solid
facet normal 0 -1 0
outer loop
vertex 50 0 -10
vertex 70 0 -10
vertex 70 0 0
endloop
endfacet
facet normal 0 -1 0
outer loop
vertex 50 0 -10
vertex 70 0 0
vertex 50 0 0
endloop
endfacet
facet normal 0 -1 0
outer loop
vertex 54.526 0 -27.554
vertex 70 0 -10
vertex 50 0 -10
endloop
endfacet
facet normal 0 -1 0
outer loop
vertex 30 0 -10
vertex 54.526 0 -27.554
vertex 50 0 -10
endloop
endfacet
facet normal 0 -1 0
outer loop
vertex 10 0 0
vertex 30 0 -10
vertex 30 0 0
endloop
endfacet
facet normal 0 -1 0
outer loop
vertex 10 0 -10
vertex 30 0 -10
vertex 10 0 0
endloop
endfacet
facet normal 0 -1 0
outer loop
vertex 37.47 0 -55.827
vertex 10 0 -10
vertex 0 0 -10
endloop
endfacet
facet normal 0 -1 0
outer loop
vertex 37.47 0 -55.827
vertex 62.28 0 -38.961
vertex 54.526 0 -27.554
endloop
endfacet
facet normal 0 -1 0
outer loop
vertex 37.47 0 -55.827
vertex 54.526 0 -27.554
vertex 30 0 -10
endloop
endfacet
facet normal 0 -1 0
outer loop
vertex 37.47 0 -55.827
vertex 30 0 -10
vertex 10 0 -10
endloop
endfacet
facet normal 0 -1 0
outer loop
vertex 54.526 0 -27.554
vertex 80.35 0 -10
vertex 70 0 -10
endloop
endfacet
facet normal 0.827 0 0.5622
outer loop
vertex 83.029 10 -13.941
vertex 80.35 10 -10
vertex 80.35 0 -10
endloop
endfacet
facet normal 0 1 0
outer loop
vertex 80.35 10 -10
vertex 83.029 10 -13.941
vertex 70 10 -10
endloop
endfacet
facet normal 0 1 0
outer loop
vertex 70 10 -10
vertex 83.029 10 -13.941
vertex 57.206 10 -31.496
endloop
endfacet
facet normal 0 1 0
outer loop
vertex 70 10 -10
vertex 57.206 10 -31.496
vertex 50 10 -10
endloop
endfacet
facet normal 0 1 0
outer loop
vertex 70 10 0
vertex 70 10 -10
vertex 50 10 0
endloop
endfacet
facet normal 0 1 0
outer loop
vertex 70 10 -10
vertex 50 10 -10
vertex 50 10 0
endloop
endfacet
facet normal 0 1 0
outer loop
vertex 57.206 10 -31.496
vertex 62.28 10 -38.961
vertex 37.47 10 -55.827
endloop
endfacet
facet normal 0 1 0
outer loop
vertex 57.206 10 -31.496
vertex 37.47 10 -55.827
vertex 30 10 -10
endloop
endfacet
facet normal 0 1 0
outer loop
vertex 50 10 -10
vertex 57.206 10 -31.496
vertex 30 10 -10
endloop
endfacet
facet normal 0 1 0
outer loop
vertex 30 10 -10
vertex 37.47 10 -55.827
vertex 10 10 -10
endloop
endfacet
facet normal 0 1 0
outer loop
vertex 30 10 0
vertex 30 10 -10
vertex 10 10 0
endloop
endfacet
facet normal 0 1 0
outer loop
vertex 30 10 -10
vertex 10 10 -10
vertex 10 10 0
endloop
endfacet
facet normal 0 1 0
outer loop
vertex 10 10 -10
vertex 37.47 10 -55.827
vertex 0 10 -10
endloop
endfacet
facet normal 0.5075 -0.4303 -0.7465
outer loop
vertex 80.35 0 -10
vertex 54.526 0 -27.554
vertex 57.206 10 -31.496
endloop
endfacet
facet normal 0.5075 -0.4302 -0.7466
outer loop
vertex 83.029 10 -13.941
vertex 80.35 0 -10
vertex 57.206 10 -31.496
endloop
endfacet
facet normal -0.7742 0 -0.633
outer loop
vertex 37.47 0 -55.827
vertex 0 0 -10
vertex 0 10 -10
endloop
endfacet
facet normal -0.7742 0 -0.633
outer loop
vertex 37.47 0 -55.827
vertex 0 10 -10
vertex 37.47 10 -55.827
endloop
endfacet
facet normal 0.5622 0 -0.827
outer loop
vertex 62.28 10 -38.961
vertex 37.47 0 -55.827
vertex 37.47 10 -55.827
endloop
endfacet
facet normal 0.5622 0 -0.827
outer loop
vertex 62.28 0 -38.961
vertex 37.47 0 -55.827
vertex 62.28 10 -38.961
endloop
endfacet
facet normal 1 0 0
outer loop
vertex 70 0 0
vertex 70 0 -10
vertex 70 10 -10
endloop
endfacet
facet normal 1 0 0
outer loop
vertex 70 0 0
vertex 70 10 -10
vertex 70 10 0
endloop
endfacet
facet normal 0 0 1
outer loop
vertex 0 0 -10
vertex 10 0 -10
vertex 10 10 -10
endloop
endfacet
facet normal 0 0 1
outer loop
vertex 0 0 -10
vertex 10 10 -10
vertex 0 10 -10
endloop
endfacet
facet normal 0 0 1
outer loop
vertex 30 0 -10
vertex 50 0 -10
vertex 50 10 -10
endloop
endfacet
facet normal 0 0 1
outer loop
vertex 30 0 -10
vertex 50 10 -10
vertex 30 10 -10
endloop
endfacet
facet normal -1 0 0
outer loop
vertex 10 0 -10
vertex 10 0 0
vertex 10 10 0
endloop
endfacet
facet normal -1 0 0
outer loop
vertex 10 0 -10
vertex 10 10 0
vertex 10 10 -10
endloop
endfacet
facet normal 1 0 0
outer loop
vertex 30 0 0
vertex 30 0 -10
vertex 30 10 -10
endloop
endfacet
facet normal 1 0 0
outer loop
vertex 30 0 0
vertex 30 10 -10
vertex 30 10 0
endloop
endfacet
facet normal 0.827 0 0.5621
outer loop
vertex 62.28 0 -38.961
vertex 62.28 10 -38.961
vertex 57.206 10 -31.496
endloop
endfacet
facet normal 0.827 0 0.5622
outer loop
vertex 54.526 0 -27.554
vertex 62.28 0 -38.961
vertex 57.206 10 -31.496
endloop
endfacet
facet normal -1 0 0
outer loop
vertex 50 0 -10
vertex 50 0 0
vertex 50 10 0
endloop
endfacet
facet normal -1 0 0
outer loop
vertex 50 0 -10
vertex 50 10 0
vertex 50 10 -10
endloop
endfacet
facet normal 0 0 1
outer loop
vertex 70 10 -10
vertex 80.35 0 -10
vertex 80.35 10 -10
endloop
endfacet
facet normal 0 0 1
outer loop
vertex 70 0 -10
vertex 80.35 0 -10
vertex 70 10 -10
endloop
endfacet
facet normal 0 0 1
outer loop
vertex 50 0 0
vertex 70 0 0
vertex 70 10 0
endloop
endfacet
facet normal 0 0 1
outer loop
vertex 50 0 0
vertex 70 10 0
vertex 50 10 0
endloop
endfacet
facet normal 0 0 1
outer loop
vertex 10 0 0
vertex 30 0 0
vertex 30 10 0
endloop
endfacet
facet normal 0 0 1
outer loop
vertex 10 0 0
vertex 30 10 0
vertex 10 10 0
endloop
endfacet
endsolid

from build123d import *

# Parameters (mm, degrees)
BOSS_EXTRUDE1_DEPTH = 10
BOSS_EXTRUDE2_START = 29.60383513
BOSS_EXTRUDE2_DEPTH = 31.225392193


# Read off the part's stored shape, not the designer's step: Boss-Extrude2
with BuildPart() as part:
    # Sketch1 → Boss-Extrude1 (new body)
    with BuildSketch(Plane(origin=(0, 0, 0), x_dir=(1, 0, 0), z_dir=(0, 1, 0))):
        Polygon((10, 0), (10, 10), (0, 10), (37.469962049, 55.82661754), (62.28046579, 38.961300937), (54.526318582, 27.55420418), (80.350242243, 10), (70, 10), (70, 0), (50, 0), (50, 10), (30, 10), (30, 0), align=None)
    extrude(amount=BOSS_EXTRUDE1_DEPTH)

    # Boss-Extrude2 outline → Boss-Extrude2 (add)
    with BuildSketch(Plane(origin=(0, 0, 0), x_dir=(0.562177220107601, 0, -0.8270167913604233), z_dir=(0.8270167913604233, 0, 0.5621772201076011)).offset(BOSS_EXTRUDE2_START)):
        Polygon((53.441243733, 0), (58.207083275, 10), (53.441243733, 10), align=None)
    extrude(amount=BOSS_EXTRUDE2_DEPTH)


solid = part.part
